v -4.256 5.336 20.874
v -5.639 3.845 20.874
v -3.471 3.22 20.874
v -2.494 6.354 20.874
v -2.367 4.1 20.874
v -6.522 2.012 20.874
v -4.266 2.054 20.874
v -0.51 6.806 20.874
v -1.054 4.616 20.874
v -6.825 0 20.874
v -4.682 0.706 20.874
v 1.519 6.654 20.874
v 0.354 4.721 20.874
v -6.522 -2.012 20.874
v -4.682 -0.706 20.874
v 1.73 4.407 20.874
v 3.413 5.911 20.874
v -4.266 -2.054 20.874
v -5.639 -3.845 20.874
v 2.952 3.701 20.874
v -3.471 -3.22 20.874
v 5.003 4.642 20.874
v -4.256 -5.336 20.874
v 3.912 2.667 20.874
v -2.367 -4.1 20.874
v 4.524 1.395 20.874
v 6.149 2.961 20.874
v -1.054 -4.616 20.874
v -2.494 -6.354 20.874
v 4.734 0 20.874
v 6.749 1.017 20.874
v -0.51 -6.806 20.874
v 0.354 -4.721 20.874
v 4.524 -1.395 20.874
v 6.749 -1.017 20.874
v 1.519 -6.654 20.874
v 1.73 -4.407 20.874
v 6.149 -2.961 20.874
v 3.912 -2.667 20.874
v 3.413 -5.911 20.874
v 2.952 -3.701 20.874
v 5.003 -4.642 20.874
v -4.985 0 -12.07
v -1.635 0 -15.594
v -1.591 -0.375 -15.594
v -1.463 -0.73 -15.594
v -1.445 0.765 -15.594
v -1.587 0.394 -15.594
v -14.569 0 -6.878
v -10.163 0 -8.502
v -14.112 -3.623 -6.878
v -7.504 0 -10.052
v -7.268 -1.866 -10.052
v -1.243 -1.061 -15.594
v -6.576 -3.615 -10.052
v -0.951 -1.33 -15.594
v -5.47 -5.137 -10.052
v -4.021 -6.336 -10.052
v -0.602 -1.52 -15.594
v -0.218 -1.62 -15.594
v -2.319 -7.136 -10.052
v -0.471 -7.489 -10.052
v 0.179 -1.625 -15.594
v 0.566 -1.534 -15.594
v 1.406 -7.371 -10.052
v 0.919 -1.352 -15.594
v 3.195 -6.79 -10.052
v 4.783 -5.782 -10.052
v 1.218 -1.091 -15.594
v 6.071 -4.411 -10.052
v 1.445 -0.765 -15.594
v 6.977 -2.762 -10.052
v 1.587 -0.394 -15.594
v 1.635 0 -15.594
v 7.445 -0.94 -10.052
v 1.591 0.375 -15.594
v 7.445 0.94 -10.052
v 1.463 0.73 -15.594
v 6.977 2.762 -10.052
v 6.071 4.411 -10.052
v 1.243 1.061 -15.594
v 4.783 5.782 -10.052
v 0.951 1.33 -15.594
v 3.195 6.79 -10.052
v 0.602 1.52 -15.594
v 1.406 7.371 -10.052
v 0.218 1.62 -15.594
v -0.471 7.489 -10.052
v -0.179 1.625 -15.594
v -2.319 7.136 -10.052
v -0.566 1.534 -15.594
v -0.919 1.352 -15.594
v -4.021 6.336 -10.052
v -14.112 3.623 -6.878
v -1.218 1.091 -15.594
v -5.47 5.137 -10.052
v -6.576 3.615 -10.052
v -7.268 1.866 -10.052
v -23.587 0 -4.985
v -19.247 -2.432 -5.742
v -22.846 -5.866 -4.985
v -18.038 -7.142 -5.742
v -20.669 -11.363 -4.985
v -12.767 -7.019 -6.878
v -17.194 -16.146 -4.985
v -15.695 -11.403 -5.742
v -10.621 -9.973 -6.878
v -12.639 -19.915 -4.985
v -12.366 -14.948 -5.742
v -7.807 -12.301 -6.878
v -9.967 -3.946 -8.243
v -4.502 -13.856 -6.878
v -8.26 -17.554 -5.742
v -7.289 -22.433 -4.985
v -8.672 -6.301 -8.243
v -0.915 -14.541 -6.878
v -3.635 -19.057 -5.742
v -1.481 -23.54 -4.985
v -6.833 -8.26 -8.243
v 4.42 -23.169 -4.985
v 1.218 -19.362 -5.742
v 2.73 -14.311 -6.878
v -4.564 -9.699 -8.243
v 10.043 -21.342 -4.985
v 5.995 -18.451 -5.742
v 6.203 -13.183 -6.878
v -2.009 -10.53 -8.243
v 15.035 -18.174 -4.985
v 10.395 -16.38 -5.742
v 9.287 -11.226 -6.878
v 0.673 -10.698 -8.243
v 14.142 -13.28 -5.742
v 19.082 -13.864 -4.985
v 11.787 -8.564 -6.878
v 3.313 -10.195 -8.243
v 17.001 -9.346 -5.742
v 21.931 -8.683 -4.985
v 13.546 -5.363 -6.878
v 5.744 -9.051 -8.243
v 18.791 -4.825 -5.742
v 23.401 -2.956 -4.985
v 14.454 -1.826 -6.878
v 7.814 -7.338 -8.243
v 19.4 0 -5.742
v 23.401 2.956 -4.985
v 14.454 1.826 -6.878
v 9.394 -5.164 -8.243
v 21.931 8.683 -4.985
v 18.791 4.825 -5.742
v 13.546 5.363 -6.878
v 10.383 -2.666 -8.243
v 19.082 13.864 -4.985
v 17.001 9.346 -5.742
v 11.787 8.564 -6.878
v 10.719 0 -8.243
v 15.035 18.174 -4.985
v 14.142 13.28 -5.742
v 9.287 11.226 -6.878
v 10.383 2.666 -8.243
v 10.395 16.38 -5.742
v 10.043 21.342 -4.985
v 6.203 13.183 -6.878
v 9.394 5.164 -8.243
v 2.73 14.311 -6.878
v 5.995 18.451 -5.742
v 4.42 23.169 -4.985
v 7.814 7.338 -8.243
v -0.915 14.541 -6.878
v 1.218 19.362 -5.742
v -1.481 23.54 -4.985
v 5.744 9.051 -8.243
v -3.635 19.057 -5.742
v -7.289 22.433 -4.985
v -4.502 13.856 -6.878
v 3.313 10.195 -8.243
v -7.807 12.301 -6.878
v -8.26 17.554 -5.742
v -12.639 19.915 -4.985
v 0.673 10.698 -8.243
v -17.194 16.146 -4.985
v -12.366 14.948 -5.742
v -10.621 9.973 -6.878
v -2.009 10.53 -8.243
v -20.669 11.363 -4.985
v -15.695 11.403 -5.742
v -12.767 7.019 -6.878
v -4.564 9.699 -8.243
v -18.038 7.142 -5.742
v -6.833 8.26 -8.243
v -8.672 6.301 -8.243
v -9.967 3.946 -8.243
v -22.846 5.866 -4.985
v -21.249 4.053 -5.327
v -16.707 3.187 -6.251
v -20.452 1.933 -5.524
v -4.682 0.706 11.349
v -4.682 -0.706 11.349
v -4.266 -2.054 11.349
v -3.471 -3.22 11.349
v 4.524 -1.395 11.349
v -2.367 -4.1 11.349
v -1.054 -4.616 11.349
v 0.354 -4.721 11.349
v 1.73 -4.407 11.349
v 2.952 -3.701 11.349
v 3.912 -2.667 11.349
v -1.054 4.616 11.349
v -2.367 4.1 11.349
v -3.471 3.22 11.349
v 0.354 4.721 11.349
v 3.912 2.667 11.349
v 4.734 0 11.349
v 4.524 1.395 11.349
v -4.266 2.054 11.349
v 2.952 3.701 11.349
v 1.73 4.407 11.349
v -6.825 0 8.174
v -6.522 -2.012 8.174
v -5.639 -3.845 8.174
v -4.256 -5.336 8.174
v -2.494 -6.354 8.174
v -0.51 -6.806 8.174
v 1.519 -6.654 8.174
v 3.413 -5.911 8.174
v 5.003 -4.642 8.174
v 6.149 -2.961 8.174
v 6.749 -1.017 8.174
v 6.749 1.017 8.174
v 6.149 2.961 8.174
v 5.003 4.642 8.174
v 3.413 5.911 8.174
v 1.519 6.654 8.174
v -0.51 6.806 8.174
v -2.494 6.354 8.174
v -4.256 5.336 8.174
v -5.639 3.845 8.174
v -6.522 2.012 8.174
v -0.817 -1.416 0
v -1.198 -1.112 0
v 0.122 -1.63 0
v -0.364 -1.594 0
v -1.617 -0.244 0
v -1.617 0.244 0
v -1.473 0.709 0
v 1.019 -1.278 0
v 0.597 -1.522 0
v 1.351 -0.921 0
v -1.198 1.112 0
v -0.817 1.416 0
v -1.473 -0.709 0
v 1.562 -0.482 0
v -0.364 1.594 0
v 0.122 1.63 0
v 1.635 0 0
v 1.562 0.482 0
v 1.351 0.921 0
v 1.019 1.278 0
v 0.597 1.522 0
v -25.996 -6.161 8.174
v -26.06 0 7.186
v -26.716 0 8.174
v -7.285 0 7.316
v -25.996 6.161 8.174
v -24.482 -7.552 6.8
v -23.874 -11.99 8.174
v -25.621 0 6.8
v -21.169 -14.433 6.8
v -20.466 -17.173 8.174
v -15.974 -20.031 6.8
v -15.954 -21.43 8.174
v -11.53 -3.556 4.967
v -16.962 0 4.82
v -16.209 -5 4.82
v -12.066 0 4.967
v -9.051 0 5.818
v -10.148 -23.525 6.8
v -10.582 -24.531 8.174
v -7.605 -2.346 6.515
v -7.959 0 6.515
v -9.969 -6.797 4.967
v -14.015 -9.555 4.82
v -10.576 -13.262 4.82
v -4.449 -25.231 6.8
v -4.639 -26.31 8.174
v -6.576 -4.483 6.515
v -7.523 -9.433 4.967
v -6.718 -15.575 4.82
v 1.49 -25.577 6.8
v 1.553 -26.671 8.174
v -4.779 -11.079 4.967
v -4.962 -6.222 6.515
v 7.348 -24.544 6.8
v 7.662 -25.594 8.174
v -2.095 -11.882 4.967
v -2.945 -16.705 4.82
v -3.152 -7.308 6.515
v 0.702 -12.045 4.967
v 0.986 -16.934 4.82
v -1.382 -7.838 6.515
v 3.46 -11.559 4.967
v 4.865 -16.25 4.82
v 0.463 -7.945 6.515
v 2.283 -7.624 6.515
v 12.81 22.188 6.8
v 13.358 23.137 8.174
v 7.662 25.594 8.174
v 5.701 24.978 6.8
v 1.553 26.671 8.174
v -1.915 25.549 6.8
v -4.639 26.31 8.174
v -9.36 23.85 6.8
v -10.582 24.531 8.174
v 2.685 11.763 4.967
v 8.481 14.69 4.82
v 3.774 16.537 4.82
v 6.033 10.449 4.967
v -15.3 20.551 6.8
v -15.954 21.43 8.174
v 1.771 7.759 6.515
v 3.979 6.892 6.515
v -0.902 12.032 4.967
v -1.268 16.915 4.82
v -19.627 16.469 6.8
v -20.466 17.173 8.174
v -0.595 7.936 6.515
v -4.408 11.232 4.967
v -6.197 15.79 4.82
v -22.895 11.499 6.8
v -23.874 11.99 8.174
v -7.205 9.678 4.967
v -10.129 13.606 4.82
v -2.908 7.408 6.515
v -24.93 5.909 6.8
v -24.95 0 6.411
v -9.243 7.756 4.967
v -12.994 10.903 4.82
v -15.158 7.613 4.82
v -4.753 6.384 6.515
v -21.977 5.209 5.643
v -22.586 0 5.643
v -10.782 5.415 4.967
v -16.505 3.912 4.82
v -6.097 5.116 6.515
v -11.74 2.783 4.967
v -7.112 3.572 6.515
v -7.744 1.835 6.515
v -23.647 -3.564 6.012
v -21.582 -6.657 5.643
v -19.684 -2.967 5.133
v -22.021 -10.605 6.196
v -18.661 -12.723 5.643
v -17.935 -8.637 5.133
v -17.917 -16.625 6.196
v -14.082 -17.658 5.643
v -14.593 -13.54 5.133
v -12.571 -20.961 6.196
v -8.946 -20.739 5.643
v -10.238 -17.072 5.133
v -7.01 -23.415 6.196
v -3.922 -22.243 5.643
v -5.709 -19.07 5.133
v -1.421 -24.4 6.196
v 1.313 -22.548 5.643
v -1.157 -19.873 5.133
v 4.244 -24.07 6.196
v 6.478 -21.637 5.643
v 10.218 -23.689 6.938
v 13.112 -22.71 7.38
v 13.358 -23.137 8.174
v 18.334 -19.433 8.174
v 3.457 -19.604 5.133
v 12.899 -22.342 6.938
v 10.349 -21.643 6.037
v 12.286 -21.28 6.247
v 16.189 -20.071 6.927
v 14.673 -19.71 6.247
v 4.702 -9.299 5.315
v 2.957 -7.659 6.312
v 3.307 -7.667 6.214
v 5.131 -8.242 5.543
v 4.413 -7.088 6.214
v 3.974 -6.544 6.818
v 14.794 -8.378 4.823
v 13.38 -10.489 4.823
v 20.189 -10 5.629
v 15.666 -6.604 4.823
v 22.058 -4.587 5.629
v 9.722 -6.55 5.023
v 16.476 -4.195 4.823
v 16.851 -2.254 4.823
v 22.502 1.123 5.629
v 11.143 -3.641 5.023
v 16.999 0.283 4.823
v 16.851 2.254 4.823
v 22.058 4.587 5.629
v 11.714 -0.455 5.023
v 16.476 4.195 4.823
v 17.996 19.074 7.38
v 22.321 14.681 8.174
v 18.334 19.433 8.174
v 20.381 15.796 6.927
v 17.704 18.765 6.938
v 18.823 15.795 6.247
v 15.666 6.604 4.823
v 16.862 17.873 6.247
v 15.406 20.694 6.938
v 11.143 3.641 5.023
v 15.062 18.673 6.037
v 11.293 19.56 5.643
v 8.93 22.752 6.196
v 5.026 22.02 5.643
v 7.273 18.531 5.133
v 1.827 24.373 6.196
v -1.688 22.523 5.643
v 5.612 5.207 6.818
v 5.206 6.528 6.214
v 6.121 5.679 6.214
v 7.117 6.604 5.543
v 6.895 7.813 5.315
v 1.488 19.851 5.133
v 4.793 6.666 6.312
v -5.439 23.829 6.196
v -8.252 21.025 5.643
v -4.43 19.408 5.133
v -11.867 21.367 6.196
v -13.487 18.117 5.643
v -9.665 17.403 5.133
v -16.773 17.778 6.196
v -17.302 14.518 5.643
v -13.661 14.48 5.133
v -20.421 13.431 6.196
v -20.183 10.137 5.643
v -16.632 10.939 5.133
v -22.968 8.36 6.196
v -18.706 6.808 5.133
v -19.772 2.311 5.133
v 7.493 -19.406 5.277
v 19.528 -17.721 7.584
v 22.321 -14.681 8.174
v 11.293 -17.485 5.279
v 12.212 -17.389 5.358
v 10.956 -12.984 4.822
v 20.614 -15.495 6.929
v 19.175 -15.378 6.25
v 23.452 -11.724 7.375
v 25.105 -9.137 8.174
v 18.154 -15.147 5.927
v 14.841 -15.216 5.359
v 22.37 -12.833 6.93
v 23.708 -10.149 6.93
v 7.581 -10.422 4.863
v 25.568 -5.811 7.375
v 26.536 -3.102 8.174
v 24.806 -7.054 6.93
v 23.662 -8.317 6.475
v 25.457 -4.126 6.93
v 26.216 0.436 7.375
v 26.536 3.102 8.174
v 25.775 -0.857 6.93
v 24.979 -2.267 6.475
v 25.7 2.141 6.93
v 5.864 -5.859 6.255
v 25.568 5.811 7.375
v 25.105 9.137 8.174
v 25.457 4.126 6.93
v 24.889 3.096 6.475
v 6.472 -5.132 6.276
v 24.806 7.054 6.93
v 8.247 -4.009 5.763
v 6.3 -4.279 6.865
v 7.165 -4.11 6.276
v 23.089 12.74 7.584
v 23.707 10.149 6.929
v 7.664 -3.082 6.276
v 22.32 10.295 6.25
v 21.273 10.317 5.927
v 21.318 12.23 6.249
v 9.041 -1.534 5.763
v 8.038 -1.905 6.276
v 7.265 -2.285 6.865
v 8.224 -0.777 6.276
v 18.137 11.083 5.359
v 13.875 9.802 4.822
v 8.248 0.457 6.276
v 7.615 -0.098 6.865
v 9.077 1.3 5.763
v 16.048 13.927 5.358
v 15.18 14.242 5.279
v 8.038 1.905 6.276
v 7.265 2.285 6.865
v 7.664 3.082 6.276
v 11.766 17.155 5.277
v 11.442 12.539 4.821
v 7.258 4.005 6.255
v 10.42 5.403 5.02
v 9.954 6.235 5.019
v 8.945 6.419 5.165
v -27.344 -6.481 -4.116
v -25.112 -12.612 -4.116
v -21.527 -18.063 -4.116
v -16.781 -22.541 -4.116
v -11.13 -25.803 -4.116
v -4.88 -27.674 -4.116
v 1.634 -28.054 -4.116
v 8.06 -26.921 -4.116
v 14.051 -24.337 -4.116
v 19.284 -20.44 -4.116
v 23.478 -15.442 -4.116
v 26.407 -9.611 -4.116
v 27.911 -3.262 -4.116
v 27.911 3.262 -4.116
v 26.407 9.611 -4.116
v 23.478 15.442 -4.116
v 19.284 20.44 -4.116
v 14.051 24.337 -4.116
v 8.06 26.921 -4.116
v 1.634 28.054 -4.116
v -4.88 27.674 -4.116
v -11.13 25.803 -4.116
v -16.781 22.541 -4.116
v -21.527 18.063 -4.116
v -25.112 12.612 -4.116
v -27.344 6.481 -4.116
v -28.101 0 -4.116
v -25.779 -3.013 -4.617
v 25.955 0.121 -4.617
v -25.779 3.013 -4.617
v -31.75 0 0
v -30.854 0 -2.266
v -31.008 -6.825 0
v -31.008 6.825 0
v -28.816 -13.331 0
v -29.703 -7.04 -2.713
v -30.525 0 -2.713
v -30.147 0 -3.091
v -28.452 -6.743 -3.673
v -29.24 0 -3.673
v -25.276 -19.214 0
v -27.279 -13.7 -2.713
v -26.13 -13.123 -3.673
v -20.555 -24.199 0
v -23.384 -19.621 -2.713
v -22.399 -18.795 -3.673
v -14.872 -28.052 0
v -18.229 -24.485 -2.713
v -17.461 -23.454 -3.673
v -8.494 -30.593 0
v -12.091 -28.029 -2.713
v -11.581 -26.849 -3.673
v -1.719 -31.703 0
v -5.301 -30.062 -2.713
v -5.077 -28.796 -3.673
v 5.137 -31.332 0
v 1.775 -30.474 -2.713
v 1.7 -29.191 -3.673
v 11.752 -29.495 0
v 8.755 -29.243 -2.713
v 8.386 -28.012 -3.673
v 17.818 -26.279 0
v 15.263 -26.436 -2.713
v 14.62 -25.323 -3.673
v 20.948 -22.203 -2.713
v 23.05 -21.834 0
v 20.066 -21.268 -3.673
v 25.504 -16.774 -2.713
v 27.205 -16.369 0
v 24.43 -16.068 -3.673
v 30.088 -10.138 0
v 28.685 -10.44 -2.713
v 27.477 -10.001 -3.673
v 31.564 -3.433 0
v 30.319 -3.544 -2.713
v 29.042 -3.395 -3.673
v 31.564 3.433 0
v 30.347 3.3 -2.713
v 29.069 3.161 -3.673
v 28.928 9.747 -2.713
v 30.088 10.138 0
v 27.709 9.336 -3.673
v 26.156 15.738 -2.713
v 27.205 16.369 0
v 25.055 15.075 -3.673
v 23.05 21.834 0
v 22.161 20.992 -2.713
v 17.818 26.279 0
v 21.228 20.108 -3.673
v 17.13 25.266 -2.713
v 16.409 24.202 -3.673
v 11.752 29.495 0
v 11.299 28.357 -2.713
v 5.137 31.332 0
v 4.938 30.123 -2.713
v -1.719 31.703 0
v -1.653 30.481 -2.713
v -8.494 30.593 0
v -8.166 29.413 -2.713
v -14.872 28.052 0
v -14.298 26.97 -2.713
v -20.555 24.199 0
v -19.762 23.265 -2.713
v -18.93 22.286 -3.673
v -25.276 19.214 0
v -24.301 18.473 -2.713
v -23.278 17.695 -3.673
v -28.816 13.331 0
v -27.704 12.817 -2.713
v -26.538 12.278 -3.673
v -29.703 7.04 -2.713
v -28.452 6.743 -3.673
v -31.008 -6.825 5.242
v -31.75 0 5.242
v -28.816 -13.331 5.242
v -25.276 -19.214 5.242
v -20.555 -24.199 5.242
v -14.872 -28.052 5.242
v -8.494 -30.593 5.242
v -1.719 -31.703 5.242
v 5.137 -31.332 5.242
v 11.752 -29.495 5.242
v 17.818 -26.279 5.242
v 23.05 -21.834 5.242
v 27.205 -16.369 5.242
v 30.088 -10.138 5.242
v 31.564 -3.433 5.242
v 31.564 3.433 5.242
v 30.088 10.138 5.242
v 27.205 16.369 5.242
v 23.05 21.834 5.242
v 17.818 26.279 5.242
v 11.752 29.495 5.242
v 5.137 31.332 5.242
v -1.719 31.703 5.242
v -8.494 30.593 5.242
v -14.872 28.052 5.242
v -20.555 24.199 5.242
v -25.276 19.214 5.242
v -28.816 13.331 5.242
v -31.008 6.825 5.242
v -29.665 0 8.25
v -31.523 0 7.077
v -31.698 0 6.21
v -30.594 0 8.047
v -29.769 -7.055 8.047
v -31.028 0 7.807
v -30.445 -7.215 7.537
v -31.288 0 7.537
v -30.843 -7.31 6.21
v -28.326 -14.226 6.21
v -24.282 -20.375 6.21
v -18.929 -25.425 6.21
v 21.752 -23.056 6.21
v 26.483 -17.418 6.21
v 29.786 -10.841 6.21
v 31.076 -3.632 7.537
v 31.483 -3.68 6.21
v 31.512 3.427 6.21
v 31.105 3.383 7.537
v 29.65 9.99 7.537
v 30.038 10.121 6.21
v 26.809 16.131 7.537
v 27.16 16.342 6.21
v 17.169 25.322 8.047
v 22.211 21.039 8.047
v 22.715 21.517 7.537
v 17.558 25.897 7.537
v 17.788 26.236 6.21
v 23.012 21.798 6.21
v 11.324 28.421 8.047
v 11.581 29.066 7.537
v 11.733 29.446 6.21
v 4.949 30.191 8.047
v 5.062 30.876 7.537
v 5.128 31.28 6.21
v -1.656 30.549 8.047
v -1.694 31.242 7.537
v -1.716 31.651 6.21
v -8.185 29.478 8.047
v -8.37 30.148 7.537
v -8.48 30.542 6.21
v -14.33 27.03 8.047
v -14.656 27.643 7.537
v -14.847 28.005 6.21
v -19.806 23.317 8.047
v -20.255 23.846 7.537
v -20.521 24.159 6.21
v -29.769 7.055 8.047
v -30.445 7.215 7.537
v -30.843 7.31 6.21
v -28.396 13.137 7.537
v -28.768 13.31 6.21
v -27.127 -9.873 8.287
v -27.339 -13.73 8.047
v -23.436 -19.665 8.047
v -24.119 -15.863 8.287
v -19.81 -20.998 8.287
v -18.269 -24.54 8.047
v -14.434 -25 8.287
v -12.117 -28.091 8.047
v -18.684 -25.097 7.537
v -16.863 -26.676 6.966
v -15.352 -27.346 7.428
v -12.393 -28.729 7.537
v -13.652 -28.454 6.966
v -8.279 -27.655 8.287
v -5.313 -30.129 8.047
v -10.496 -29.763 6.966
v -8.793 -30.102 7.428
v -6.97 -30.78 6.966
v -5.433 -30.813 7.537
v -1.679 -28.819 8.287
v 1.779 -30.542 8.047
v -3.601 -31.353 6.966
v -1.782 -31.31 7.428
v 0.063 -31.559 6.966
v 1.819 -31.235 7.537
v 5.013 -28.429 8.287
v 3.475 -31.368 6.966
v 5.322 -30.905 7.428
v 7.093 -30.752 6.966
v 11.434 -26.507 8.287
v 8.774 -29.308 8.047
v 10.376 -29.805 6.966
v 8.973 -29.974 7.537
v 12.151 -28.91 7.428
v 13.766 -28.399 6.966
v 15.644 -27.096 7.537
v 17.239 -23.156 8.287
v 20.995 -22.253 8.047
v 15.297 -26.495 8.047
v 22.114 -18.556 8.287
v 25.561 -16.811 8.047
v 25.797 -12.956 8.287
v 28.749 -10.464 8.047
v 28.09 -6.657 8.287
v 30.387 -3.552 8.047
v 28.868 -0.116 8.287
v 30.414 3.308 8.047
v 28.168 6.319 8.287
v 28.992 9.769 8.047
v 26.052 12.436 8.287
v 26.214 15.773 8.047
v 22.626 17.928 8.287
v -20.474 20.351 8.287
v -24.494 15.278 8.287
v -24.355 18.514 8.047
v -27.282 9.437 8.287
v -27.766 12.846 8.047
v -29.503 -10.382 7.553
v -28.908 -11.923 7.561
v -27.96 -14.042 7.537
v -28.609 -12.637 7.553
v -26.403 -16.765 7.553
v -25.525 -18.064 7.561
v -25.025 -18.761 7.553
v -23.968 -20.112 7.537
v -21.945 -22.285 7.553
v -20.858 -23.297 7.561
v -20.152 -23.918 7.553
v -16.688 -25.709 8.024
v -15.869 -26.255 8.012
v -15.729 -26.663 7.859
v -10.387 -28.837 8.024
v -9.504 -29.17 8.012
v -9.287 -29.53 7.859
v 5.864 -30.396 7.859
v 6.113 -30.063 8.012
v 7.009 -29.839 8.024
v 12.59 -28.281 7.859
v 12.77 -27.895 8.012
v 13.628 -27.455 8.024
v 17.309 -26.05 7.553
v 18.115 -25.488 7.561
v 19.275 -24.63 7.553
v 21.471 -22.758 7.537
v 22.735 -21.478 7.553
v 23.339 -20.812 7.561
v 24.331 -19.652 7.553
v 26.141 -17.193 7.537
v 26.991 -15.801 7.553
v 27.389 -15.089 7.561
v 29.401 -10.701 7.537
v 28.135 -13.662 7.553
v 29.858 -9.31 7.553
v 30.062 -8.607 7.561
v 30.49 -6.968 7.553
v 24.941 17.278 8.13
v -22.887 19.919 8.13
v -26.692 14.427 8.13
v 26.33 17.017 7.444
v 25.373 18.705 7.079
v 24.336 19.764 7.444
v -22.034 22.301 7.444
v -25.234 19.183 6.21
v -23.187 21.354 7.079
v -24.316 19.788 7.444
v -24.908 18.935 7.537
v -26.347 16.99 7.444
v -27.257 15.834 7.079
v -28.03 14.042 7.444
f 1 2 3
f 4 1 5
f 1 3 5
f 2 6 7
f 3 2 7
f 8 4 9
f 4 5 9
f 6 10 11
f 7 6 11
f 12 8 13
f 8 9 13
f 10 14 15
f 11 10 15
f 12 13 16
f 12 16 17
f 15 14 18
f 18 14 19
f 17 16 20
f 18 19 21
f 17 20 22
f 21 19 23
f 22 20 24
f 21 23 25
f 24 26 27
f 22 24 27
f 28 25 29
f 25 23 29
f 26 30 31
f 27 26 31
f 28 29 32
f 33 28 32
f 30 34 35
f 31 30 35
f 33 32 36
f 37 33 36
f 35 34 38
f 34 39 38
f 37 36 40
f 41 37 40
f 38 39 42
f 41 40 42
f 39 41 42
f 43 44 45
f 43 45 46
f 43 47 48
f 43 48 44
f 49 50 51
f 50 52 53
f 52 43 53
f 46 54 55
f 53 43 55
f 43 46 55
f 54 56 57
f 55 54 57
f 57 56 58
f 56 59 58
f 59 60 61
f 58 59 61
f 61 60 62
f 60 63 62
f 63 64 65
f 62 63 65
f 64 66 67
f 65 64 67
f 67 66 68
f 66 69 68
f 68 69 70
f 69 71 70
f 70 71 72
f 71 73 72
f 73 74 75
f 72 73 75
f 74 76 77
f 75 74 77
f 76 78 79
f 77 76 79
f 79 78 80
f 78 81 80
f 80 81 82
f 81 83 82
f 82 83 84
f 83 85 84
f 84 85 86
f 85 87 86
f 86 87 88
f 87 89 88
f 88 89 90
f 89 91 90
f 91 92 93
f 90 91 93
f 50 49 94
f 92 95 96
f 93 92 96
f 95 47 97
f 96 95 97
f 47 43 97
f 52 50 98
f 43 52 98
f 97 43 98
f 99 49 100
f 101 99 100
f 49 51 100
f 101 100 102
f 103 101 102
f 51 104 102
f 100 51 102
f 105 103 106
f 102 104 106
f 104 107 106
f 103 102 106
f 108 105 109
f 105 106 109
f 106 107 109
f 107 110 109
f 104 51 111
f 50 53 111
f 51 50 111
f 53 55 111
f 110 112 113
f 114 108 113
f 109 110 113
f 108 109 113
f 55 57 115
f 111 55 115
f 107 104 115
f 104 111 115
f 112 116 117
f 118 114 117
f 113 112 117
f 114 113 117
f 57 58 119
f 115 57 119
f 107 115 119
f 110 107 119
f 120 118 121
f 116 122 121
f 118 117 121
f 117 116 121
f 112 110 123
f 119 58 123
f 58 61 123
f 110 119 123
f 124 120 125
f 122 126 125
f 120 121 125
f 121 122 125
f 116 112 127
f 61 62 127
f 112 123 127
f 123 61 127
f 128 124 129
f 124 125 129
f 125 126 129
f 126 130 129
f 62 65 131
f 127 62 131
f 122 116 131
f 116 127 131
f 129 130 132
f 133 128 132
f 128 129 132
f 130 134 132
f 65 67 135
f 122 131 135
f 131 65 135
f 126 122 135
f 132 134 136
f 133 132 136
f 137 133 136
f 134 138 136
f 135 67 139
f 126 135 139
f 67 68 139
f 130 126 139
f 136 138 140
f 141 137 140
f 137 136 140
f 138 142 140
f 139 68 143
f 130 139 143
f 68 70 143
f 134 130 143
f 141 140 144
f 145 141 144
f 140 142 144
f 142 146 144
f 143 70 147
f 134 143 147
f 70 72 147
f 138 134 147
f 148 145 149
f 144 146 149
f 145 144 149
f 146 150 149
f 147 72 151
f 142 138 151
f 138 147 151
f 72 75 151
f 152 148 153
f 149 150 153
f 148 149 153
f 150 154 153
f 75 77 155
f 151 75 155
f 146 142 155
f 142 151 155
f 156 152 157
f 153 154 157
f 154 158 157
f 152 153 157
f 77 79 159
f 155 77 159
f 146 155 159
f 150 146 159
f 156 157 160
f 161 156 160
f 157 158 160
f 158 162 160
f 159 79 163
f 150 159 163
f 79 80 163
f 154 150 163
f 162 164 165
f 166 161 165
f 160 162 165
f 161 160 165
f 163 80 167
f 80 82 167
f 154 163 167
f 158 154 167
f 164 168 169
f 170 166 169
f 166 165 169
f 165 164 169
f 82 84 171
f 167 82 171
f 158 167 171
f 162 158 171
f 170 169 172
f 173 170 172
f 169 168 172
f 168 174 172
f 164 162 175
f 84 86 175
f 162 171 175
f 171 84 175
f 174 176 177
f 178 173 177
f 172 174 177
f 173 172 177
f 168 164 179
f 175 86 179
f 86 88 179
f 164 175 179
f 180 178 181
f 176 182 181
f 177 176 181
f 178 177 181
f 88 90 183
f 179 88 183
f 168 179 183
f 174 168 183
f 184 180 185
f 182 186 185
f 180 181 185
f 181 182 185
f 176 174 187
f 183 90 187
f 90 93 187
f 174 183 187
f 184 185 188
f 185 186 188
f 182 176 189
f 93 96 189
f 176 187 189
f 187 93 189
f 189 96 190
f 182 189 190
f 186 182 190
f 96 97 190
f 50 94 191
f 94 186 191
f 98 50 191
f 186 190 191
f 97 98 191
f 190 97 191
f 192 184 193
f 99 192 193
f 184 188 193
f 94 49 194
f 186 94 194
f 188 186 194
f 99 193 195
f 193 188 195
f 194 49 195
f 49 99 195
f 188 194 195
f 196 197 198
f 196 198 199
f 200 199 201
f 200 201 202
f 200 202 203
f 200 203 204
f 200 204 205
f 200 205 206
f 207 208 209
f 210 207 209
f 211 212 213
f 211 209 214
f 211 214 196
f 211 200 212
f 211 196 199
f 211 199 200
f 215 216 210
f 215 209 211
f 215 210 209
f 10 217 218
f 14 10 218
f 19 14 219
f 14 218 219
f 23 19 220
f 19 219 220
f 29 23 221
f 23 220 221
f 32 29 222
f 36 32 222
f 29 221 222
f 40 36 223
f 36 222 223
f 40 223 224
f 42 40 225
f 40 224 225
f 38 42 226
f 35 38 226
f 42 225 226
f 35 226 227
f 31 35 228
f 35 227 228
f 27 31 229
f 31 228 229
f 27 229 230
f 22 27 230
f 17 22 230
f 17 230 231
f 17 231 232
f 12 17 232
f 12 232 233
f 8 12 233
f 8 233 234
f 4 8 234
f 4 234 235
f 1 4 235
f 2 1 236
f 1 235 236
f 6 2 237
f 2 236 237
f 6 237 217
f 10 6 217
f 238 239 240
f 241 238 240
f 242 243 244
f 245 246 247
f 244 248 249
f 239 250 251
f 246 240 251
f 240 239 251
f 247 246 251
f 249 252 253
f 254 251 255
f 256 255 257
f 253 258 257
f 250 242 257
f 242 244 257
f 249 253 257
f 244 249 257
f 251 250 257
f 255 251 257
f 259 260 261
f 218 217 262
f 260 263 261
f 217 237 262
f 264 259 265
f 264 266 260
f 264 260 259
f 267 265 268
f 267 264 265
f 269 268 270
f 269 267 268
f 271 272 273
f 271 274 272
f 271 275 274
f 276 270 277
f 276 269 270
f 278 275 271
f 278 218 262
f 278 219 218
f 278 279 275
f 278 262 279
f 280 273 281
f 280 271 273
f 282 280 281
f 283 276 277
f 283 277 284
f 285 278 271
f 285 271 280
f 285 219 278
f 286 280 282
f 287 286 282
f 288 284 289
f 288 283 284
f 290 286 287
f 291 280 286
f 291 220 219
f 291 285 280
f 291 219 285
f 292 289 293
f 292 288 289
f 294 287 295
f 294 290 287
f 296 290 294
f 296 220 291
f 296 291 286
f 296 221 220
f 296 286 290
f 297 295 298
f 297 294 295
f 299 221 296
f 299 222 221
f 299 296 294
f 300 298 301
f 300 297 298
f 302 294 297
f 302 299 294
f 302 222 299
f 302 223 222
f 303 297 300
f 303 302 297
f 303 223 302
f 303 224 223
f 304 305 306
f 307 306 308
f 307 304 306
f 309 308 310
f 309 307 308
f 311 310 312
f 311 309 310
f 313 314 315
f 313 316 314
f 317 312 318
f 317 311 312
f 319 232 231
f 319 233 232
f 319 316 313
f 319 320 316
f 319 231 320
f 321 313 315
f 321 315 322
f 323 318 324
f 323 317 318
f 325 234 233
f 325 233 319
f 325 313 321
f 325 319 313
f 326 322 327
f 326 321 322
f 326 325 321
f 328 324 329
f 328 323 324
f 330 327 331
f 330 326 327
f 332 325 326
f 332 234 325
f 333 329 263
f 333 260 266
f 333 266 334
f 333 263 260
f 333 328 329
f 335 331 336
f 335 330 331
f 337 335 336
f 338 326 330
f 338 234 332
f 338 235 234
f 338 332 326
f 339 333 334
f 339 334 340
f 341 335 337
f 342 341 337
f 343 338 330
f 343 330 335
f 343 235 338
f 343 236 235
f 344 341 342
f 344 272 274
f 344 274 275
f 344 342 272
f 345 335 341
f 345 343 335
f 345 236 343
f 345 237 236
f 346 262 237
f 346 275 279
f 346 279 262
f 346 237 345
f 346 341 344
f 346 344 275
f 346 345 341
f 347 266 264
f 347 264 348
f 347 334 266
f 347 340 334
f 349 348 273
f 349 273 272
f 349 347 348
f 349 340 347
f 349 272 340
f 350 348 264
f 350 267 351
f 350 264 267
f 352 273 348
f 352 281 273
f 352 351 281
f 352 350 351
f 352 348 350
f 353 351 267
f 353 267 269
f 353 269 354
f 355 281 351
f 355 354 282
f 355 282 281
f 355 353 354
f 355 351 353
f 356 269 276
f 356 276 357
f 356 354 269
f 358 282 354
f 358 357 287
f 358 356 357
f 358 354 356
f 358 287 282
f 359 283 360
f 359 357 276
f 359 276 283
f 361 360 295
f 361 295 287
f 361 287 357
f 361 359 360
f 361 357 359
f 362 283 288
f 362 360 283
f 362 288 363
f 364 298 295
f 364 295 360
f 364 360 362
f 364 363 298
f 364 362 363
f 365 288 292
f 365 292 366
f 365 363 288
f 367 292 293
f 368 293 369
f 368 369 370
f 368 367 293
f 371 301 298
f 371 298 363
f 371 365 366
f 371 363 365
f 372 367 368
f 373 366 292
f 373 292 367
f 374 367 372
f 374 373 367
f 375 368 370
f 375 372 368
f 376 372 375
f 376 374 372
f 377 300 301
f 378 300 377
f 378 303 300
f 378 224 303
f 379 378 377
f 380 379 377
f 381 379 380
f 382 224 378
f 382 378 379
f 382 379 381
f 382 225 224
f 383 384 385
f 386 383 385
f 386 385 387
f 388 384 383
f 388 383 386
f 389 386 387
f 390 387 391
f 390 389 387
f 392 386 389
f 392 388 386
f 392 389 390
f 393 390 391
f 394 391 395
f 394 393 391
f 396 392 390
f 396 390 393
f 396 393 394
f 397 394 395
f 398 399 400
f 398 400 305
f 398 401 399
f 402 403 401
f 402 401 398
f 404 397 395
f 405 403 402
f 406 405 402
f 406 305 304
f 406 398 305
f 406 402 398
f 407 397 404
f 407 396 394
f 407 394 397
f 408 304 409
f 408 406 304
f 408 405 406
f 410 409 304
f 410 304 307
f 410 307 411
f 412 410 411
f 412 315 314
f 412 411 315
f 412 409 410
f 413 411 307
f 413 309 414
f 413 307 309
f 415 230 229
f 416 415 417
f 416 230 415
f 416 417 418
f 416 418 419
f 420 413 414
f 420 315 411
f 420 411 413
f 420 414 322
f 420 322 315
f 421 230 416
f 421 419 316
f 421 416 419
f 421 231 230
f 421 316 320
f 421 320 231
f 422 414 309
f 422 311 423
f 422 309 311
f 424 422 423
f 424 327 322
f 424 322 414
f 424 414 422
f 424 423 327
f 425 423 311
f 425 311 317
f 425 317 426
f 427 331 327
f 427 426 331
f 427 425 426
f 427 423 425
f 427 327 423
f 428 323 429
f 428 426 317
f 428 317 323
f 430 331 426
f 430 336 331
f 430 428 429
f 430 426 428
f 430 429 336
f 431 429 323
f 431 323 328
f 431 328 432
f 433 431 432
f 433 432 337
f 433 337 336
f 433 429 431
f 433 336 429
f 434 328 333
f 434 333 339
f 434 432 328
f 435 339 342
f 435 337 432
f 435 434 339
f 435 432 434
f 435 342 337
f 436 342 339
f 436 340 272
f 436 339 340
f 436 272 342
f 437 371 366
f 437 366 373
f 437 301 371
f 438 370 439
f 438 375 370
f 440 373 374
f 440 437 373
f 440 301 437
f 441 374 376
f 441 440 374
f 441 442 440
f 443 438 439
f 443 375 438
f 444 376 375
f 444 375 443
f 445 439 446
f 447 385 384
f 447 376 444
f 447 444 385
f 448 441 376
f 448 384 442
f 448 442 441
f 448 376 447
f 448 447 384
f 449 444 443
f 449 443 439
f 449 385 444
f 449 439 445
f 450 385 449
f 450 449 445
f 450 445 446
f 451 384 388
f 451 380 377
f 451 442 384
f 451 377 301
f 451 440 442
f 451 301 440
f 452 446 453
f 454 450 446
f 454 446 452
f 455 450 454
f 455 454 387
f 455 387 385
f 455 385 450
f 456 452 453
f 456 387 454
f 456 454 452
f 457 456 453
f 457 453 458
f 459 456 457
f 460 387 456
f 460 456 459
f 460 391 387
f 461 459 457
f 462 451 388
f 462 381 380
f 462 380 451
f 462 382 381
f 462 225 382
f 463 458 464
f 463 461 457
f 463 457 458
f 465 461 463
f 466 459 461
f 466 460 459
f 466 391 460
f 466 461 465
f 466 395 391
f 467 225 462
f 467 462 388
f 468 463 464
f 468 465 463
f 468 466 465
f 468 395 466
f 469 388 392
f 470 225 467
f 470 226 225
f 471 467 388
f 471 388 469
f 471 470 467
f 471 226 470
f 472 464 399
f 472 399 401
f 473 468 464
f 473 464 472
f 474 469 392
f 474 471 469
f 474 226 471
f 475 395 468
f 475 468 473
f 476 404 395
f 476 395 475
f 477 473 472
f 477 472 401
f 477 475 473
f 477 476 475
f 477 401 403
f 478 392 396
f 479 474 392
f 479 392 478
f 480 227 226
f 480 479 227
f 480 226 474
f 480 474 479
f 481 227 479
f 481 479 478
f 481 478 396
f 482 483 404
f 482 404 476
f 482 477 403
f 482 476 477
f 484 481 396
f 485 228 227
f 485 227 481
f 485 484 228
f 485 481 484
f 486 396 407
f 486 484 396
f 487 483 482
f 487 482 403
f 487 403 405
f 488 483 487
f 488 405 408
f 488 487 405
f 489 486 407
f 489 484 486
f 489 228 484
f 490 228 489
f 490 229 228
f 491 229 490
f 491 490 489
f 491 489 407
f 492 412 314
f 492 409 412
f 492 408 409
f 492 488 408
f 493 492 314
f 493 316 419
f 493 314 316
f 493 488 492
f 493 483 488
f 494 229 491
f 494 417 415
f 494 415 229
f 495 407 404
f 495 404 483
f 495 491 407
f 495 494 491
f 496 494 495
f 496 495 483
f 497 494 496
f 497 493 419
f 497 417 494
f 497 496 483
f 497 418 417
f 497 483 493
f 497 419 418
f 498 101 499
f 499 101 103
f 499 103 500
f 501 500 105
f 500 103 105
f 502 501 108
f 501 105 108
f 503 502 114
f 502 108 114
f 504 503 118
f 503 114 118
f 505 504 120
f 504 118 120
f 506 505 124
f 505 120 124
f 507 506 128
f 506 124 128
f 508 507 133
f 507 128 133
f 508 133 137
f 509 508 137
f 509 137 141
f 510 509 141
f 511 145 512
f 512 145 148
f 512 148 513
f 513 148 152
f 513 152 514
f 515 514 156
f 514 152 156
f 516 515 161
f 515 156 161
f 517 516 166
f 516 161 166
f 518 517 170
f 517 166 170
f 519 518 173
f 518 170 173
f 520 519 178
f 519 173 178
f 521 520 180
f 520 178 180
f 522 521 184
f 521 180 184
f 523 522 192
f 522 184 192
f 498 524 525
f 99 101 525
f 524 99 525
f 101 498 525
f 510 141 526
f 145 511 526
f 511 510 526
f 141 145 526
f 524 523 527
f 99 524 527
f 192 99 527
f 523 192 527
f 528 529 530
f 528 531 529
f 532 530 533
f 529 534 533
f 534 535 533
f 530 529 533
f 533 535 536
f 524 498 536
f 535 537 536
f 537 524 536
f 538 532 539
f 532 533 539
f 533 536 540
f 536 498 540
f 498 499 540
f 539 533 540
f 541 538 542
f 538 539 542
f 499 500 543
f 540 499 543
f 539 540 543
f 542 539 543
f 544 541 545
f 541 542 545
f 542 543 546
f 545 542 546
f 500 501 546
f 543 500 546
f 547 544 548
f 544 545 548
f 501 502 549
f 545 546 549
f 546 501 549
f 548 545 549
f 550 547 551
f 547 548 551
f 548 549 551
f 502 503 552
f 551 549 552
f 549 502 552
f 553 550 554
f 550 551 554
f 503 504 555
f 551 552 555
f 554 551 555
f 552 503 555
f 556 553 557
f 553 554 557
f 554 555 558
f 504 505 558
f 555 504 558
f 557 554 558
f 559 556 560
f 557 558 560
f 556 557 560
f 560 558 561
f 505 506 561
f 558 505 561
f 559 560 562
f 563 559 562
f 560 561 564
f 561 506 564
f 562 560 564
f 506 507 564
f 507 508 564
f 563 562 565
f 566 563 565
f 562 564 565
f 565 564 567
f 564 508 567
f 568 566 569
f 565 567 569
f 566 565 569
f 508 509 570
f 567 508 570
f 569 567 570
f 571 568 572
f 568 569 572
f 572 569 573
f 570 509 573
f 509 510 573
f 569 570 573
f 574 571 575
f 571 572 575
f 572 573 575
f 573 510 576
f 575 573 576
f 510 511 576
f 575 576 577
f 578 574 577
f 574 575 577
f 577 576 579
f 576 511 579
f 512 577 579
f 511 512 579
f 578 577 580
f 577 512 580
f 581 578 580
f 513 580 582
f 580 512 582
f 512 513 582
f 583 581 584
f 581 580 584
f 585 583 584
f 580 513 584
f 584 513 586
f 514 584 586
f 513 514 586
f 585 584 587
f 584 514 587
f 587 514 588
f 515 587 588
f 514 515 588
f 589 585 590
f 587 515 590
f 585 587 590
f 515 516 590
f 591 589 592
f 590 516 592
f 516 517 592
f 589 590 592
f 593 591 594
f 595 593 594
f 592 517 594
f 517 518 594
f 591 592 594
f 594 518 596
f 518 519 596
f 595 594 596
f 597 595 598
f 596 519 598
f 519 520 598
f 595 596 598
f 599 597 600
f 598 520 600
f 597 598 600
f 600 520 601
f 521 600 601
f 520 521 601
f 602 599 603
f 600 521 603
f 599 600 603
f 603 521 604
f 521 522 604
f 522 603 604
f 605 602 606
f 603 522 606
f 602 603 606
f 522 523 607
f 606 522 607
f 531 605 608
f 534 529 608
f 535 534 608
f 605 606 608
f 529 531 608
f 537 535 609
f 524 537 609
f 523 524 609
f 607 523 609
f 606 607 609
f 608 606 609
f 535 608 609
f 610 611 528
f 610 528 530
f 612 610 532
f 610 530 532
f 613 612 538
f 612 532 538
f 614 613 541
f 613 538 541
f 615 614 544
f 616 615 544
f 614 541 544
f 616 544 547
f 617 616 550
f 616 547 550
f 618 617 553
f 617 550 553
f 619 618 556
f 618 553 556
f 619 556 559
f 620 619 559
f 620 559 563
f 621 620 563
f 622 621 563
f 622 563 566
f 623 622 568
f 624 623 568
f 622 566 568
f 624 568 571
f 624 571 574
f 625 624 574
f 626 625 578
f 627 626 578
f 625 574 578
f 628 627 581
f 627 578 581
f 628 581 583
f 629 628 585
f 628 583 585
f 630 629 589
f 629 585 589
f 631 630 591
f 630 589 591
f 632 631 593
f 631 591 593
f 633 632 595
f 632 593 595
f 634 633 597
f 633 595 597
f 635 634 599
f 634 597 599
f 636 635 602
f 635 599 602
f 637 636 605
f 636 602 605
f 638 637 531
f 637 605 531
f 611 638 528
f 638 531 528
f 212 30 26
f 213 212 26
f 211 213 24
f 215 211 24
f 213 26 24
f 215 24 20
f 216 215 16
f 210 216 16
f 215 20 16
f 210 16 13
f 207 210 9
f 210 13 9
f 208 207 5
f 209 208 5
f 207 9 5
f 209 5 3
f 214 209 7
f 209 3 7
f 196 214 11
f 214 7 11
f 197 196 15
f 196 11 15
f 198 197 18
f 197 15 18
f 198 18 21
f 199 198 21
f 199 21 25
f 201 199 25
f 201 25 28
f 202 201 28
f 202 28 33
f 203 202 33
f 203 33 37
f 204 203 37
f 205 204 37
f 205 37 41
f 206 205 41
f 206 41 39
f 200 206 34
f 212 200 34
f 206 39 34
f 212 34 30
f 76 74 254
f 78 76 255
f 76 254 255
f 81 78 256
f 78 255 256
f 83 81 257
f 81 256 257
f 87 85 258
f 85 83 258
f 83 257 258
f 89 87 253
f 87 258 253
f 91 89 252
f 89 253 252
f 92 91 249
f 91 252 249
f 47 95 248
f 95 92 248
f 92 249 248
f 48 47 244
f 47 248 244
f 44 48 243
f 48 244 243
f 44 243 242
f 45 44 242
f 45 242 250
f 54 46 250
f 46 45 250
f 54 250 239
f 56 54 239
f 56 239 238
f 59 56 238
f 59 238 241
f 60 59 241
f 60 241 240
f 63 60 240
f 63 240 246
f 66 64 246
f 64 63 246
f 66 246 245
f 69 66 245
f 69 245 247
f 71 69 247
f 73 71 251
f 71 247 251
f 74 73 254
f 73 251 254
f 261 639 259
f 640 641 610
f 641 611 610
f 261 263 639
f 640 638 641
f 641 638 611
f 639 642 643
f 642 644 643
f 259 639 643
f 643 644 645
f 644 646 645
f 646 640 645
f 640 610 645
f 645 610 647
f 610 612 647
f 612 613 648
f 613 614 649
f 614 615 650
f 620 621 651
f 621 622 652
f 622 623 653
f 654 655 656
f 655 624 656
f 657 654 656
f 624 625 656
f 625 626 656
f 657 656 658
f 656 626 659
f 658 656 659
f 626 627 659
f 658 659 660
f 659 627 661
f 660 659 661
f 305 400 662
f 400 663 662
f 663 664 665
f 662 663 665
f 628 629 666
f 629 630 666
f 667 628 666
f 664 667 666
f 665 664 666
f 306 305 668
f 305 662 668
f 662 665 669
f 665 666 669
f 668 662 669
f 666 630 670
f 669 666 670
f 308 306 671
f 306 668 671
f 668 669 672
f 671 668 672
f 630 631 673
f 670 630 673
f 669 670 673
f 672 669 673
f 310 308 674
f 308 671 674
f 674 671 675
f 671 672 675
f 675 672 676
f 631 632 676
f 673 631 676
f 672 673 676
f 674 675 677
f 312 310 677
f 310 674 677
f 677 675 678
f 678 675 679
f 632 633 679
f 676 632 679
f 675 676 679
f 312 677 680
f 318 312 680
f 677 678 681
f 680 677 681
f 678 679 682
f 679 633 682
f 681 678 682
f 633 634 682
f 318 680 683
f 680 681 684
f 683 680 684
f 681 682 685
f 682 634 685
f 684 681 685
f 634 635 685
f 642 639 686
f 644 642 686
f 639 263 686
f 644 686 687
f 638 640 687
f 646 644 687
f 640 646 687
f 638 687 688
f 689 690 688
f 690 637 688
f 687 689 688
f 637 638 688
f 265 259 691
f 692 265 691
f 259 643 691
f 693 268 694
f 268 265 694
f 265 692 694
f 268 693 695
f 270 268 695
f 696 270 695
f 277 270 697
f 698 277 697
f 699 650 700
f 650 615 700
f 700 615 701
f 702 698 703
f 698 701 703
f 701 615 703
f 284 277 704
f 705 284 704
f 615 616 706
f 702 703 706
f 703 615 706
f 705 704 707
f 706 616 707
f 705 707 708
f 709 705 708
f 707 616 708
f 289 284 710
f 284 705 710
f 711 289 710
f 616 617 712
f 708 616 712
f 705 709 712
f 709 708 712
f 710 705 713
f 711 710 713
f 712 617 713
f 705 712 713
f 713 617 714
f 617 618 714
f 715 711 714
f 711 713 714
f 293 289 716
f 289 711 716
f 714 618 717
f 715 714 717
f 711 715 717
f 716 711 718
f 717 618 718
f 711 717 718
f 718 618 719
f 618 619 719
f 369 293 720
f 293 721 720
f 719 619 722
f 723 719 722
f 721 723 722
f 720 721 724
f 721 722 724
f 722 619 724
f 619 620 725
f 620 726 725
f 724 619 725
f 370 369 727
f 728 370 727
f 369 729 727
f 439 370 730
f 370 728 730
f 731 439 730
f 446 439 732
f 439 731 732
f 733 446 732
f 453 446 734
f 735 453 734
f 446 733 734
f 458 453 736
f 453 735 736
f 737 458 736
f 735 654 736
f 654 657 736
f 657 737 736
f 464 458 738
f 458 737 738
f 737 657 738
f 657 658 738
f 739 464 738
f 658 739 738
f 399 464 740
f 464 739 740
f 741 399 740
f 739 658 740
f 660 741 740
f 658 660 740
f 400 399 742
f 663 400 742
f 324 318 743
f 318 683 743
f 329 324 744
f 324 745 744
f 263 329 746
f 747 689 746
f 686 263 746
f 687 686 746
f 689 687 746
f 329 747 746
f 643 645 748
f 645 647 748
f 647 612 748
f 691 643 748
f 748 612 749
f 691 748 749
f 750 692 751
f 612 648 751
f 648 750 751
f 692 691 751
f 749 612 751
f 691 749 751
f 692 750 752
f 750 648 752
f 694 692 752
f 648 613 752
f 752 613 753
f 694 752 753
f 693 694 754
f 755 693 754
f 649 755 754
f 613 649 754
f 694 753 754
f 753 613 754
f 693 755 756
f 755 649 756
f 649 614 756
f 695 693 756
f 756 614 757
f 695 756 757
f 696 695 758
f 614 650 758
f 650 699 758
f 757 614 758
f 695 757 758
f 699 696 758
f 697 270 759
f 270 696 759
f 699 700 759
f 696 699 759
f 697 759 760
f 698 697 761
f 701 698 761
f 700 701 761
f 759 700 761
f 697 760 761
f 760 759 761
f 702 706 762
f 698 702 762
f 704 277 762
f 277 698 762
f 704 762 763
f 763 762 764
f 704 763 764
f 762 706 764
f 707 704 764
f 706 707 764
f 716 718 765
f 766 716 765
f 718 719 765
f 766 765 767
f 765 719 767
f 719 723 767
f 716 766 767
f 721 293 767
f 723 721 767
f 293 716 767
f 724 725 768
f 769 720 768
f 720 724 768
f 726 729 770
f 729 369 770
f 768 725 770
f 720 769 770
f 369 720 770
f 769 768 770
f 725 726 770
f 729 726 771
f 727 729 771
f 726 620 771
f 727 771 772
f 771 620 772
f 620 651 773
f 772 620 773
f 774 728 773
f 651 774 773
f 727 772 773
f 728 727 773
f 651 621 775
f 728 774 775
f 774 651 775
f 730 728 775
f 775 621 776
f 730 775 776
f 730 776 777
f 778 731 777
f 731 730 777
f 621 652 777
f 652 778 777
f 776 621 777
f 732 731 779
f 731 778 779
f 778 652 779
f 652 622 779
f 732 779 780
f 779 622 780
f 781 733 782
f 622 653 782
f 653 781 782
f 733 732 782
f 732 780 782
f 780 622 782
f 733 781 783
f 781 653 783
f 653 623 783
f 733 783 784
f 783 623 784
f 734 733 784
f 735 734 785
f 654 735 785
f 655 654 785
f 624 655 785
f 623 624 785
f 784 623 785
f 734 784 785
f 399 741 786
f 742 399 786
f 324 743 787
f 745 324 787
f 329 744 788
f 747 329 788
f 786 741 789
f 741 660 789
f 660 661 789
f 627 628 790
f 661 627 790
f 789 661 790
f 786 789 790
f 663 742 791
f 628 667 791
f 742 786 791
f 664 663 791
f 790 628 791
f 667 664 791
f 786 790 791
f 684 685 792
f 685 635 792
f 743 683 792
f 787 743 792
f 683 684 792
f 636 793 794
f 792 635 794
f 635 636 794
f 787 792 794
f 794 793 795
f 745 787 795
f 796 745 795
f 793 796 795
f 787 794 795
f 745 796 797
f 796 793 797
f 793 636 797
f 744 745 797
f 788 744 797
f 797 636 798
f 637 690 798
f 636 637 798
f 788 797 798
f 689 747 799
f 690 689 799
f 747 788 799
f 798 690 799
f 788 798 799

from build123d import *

# Parameters (mm, degrees)
F2_DEPTH = 12.7
F3_R     = 1.6348042273
F4_DEPTH = 19.6596
F5_R     = 4.7343922938
F6_DEPTH = 9.525


# Not quite as in the source:
# - a feature names something its author has since deleted; it is built from what else it names


with BuildPart() as f1:
    # F0 (on Front) → F1 (revolve)
    with BuildSketch(Plane.XZ):
        Polygon((0, 4.4785123318), (0, 8.1742972476), (-4.7625, 8.1742972476), (-6.8253115751, 8.1742972476), (-6.8253115751, 4.4785123318), align=None)
        with BuildLine():
            Line((0, 0), (0, 4.4785123318))
            Line((0, 4.4785123318), (-6.8253115751, 4.4785123318))
            Line((-6.8253115751, 4.4785123318), (-26.7162192613, 4.4785123318))
            Line((-26.7162192613, 4.4785123318), (-26.7162192613, 8.1742972476))
            add(Edge.make_bspline(
                [(-26.7162192613, 8.1742972476), (-28.491194666, 8.3112325103), (-31.642316511, 8.5543343001), (-31.7172676235, 6.2491747733), (-31.75, 5.2424739115)],
                knots=[0, 0, 0, 0, 0.5632836469, 1, 1, 1, 1], degree=3))
            Line((-31.75, 5.2424739115), (-31.75, 0))
            Line((-31.75, 0), (0, 0))
        make_face()
        with BuildLine():
            Line((0, -4.1164574213), (0, 0))
            Line((0, 0), (-31.75, 0))
            add(Edge.make_bspline(
                [(-31.75, 0), (-31.4027760977, -1.1805231122), (-30.8776022636, -2.9683987357), (-28.8835885285, -3.872962504), (-28.1014181098, -4.1164574213)],
                knots=[0, 0, 0, 0, 0.4216161755, 0.638071699, 0.638071699, 0.638071699, 0.638071699], degree=3))
            Line((-28.1014181098, -4.1164574213), (0, -4.1164574213))
        make_face()
        with BuildLine():
            Line((-26.7162192613, 4.4785123318), (-6.8253115751, 4.4785123318))
            Line((-6.8253115751, 4.4785123318), (-6.8253115751, 8.1742972476))
            add(Edge.make_bspline(
                [(-26.7162192613, 8.1742972476), (-26.6031223158, 7.9651163147), (-26.3129395448, 7.4284024145), (-24.8626402231, 5.7951518451), (-14.4096521607, 4.0441326554), (-7.9711337562, 5.8305330049), (-7.1335011103, 7.5438995955), (-6.8253115751, 8.1742972476)],
                knots=[0, 0, 0, 0, 0.0911428309, 0.23385317, 0.5753642763, 0.8437641047, 1, 1, 1, 1], degree=3))
            Line((-26.7162192613, 8.1742972476), (-26.7162192613, 4.4785123318))
        make_face()
        with BuildLine():
            Line((0, -17.5582827176), (0, -4.1164574213))
            Line((0, -4.1164574213), (-28.1014181098, -4.1164574213))
            add(Edge.make_bspline(
                [(-28.1014181098, -4.1164574213), (-26.8429354447, -4.3749563957), (-25.5844527797, -4.6334553702), (-23.5869744443, -4.9854039485)],
                knots=[0, 0, 0, 0, 0.1942754447, 0.1942754447, 0.1942754447, 0.1942754447], degree=3))
            add(Edge.make_bspline(
                [(-23.5869744443, -4.9854039485), (-20.1583969161, -5.5895071147), (-9.8833890293, -7.2014232525), (-3.0789336633, -13.7945227485), (-0.8981879892, -16.4603168735), (0, -17.5582827176)],
                knots=[0.1942754447, 0.1942754447, 0.1942754447, 0.1942754447, 0.5277400996, 0.8054893905, 1, 1, 1, 1], degree=3))
        make_face()
        with BuildLine():
            add(Edge.make_bspline(
                [(-28.1014181098, -4.1164574213), (-26.8429354447, -4.3749563957), (-25.5844527797, -4.6334553702), (-23.5869744443, -4.9854039485)],
                knots=[0, 0, 0, 0, 0.1942754447, 0.1942754447, 0.1942754447, 0.1942754447], degree=3))
            add(Edge.make_bspline(
                [(-28.1014181098, -4.1164574213), (-26.7935761747, -4.5235974207), (-25.1901235467, -4.7535844093), (-23.5869744443, -4.9854039485)],
                knots=[0.638071699, 0.638071699, 0.638071699, 0.638071699, 1, 1, 1, 1], degree=3))
        make_face()
    revolve(axis=Axis((0, 0, -2.0582287107), (0, 0, 1)))

    # F2 (add): a face of the model
    f2_faces = [f1.faces().sort_by_distance(p)[0] for p in [
        (0, 0, 8.1742972476),
    ]]
    extrude(f2_faces, amount=F2_DEPTH)

    # F3 (on Top) → F4 (cut)
    with BuildSketch(Plane.XY):
        Circle(F3_R)
    extrude(amount=-F4_DEPTH, mode=Mode.SUBTRACT)

    # F5 (on face) → F6 (cut)
    with BuildSketch(Plane.XY.offset(20.8742972476)):
        Circle(F5_R)
    extrude(amount=-F6_DEPTH, mode=Mode.SUBTRACT)


solid = f1.part
